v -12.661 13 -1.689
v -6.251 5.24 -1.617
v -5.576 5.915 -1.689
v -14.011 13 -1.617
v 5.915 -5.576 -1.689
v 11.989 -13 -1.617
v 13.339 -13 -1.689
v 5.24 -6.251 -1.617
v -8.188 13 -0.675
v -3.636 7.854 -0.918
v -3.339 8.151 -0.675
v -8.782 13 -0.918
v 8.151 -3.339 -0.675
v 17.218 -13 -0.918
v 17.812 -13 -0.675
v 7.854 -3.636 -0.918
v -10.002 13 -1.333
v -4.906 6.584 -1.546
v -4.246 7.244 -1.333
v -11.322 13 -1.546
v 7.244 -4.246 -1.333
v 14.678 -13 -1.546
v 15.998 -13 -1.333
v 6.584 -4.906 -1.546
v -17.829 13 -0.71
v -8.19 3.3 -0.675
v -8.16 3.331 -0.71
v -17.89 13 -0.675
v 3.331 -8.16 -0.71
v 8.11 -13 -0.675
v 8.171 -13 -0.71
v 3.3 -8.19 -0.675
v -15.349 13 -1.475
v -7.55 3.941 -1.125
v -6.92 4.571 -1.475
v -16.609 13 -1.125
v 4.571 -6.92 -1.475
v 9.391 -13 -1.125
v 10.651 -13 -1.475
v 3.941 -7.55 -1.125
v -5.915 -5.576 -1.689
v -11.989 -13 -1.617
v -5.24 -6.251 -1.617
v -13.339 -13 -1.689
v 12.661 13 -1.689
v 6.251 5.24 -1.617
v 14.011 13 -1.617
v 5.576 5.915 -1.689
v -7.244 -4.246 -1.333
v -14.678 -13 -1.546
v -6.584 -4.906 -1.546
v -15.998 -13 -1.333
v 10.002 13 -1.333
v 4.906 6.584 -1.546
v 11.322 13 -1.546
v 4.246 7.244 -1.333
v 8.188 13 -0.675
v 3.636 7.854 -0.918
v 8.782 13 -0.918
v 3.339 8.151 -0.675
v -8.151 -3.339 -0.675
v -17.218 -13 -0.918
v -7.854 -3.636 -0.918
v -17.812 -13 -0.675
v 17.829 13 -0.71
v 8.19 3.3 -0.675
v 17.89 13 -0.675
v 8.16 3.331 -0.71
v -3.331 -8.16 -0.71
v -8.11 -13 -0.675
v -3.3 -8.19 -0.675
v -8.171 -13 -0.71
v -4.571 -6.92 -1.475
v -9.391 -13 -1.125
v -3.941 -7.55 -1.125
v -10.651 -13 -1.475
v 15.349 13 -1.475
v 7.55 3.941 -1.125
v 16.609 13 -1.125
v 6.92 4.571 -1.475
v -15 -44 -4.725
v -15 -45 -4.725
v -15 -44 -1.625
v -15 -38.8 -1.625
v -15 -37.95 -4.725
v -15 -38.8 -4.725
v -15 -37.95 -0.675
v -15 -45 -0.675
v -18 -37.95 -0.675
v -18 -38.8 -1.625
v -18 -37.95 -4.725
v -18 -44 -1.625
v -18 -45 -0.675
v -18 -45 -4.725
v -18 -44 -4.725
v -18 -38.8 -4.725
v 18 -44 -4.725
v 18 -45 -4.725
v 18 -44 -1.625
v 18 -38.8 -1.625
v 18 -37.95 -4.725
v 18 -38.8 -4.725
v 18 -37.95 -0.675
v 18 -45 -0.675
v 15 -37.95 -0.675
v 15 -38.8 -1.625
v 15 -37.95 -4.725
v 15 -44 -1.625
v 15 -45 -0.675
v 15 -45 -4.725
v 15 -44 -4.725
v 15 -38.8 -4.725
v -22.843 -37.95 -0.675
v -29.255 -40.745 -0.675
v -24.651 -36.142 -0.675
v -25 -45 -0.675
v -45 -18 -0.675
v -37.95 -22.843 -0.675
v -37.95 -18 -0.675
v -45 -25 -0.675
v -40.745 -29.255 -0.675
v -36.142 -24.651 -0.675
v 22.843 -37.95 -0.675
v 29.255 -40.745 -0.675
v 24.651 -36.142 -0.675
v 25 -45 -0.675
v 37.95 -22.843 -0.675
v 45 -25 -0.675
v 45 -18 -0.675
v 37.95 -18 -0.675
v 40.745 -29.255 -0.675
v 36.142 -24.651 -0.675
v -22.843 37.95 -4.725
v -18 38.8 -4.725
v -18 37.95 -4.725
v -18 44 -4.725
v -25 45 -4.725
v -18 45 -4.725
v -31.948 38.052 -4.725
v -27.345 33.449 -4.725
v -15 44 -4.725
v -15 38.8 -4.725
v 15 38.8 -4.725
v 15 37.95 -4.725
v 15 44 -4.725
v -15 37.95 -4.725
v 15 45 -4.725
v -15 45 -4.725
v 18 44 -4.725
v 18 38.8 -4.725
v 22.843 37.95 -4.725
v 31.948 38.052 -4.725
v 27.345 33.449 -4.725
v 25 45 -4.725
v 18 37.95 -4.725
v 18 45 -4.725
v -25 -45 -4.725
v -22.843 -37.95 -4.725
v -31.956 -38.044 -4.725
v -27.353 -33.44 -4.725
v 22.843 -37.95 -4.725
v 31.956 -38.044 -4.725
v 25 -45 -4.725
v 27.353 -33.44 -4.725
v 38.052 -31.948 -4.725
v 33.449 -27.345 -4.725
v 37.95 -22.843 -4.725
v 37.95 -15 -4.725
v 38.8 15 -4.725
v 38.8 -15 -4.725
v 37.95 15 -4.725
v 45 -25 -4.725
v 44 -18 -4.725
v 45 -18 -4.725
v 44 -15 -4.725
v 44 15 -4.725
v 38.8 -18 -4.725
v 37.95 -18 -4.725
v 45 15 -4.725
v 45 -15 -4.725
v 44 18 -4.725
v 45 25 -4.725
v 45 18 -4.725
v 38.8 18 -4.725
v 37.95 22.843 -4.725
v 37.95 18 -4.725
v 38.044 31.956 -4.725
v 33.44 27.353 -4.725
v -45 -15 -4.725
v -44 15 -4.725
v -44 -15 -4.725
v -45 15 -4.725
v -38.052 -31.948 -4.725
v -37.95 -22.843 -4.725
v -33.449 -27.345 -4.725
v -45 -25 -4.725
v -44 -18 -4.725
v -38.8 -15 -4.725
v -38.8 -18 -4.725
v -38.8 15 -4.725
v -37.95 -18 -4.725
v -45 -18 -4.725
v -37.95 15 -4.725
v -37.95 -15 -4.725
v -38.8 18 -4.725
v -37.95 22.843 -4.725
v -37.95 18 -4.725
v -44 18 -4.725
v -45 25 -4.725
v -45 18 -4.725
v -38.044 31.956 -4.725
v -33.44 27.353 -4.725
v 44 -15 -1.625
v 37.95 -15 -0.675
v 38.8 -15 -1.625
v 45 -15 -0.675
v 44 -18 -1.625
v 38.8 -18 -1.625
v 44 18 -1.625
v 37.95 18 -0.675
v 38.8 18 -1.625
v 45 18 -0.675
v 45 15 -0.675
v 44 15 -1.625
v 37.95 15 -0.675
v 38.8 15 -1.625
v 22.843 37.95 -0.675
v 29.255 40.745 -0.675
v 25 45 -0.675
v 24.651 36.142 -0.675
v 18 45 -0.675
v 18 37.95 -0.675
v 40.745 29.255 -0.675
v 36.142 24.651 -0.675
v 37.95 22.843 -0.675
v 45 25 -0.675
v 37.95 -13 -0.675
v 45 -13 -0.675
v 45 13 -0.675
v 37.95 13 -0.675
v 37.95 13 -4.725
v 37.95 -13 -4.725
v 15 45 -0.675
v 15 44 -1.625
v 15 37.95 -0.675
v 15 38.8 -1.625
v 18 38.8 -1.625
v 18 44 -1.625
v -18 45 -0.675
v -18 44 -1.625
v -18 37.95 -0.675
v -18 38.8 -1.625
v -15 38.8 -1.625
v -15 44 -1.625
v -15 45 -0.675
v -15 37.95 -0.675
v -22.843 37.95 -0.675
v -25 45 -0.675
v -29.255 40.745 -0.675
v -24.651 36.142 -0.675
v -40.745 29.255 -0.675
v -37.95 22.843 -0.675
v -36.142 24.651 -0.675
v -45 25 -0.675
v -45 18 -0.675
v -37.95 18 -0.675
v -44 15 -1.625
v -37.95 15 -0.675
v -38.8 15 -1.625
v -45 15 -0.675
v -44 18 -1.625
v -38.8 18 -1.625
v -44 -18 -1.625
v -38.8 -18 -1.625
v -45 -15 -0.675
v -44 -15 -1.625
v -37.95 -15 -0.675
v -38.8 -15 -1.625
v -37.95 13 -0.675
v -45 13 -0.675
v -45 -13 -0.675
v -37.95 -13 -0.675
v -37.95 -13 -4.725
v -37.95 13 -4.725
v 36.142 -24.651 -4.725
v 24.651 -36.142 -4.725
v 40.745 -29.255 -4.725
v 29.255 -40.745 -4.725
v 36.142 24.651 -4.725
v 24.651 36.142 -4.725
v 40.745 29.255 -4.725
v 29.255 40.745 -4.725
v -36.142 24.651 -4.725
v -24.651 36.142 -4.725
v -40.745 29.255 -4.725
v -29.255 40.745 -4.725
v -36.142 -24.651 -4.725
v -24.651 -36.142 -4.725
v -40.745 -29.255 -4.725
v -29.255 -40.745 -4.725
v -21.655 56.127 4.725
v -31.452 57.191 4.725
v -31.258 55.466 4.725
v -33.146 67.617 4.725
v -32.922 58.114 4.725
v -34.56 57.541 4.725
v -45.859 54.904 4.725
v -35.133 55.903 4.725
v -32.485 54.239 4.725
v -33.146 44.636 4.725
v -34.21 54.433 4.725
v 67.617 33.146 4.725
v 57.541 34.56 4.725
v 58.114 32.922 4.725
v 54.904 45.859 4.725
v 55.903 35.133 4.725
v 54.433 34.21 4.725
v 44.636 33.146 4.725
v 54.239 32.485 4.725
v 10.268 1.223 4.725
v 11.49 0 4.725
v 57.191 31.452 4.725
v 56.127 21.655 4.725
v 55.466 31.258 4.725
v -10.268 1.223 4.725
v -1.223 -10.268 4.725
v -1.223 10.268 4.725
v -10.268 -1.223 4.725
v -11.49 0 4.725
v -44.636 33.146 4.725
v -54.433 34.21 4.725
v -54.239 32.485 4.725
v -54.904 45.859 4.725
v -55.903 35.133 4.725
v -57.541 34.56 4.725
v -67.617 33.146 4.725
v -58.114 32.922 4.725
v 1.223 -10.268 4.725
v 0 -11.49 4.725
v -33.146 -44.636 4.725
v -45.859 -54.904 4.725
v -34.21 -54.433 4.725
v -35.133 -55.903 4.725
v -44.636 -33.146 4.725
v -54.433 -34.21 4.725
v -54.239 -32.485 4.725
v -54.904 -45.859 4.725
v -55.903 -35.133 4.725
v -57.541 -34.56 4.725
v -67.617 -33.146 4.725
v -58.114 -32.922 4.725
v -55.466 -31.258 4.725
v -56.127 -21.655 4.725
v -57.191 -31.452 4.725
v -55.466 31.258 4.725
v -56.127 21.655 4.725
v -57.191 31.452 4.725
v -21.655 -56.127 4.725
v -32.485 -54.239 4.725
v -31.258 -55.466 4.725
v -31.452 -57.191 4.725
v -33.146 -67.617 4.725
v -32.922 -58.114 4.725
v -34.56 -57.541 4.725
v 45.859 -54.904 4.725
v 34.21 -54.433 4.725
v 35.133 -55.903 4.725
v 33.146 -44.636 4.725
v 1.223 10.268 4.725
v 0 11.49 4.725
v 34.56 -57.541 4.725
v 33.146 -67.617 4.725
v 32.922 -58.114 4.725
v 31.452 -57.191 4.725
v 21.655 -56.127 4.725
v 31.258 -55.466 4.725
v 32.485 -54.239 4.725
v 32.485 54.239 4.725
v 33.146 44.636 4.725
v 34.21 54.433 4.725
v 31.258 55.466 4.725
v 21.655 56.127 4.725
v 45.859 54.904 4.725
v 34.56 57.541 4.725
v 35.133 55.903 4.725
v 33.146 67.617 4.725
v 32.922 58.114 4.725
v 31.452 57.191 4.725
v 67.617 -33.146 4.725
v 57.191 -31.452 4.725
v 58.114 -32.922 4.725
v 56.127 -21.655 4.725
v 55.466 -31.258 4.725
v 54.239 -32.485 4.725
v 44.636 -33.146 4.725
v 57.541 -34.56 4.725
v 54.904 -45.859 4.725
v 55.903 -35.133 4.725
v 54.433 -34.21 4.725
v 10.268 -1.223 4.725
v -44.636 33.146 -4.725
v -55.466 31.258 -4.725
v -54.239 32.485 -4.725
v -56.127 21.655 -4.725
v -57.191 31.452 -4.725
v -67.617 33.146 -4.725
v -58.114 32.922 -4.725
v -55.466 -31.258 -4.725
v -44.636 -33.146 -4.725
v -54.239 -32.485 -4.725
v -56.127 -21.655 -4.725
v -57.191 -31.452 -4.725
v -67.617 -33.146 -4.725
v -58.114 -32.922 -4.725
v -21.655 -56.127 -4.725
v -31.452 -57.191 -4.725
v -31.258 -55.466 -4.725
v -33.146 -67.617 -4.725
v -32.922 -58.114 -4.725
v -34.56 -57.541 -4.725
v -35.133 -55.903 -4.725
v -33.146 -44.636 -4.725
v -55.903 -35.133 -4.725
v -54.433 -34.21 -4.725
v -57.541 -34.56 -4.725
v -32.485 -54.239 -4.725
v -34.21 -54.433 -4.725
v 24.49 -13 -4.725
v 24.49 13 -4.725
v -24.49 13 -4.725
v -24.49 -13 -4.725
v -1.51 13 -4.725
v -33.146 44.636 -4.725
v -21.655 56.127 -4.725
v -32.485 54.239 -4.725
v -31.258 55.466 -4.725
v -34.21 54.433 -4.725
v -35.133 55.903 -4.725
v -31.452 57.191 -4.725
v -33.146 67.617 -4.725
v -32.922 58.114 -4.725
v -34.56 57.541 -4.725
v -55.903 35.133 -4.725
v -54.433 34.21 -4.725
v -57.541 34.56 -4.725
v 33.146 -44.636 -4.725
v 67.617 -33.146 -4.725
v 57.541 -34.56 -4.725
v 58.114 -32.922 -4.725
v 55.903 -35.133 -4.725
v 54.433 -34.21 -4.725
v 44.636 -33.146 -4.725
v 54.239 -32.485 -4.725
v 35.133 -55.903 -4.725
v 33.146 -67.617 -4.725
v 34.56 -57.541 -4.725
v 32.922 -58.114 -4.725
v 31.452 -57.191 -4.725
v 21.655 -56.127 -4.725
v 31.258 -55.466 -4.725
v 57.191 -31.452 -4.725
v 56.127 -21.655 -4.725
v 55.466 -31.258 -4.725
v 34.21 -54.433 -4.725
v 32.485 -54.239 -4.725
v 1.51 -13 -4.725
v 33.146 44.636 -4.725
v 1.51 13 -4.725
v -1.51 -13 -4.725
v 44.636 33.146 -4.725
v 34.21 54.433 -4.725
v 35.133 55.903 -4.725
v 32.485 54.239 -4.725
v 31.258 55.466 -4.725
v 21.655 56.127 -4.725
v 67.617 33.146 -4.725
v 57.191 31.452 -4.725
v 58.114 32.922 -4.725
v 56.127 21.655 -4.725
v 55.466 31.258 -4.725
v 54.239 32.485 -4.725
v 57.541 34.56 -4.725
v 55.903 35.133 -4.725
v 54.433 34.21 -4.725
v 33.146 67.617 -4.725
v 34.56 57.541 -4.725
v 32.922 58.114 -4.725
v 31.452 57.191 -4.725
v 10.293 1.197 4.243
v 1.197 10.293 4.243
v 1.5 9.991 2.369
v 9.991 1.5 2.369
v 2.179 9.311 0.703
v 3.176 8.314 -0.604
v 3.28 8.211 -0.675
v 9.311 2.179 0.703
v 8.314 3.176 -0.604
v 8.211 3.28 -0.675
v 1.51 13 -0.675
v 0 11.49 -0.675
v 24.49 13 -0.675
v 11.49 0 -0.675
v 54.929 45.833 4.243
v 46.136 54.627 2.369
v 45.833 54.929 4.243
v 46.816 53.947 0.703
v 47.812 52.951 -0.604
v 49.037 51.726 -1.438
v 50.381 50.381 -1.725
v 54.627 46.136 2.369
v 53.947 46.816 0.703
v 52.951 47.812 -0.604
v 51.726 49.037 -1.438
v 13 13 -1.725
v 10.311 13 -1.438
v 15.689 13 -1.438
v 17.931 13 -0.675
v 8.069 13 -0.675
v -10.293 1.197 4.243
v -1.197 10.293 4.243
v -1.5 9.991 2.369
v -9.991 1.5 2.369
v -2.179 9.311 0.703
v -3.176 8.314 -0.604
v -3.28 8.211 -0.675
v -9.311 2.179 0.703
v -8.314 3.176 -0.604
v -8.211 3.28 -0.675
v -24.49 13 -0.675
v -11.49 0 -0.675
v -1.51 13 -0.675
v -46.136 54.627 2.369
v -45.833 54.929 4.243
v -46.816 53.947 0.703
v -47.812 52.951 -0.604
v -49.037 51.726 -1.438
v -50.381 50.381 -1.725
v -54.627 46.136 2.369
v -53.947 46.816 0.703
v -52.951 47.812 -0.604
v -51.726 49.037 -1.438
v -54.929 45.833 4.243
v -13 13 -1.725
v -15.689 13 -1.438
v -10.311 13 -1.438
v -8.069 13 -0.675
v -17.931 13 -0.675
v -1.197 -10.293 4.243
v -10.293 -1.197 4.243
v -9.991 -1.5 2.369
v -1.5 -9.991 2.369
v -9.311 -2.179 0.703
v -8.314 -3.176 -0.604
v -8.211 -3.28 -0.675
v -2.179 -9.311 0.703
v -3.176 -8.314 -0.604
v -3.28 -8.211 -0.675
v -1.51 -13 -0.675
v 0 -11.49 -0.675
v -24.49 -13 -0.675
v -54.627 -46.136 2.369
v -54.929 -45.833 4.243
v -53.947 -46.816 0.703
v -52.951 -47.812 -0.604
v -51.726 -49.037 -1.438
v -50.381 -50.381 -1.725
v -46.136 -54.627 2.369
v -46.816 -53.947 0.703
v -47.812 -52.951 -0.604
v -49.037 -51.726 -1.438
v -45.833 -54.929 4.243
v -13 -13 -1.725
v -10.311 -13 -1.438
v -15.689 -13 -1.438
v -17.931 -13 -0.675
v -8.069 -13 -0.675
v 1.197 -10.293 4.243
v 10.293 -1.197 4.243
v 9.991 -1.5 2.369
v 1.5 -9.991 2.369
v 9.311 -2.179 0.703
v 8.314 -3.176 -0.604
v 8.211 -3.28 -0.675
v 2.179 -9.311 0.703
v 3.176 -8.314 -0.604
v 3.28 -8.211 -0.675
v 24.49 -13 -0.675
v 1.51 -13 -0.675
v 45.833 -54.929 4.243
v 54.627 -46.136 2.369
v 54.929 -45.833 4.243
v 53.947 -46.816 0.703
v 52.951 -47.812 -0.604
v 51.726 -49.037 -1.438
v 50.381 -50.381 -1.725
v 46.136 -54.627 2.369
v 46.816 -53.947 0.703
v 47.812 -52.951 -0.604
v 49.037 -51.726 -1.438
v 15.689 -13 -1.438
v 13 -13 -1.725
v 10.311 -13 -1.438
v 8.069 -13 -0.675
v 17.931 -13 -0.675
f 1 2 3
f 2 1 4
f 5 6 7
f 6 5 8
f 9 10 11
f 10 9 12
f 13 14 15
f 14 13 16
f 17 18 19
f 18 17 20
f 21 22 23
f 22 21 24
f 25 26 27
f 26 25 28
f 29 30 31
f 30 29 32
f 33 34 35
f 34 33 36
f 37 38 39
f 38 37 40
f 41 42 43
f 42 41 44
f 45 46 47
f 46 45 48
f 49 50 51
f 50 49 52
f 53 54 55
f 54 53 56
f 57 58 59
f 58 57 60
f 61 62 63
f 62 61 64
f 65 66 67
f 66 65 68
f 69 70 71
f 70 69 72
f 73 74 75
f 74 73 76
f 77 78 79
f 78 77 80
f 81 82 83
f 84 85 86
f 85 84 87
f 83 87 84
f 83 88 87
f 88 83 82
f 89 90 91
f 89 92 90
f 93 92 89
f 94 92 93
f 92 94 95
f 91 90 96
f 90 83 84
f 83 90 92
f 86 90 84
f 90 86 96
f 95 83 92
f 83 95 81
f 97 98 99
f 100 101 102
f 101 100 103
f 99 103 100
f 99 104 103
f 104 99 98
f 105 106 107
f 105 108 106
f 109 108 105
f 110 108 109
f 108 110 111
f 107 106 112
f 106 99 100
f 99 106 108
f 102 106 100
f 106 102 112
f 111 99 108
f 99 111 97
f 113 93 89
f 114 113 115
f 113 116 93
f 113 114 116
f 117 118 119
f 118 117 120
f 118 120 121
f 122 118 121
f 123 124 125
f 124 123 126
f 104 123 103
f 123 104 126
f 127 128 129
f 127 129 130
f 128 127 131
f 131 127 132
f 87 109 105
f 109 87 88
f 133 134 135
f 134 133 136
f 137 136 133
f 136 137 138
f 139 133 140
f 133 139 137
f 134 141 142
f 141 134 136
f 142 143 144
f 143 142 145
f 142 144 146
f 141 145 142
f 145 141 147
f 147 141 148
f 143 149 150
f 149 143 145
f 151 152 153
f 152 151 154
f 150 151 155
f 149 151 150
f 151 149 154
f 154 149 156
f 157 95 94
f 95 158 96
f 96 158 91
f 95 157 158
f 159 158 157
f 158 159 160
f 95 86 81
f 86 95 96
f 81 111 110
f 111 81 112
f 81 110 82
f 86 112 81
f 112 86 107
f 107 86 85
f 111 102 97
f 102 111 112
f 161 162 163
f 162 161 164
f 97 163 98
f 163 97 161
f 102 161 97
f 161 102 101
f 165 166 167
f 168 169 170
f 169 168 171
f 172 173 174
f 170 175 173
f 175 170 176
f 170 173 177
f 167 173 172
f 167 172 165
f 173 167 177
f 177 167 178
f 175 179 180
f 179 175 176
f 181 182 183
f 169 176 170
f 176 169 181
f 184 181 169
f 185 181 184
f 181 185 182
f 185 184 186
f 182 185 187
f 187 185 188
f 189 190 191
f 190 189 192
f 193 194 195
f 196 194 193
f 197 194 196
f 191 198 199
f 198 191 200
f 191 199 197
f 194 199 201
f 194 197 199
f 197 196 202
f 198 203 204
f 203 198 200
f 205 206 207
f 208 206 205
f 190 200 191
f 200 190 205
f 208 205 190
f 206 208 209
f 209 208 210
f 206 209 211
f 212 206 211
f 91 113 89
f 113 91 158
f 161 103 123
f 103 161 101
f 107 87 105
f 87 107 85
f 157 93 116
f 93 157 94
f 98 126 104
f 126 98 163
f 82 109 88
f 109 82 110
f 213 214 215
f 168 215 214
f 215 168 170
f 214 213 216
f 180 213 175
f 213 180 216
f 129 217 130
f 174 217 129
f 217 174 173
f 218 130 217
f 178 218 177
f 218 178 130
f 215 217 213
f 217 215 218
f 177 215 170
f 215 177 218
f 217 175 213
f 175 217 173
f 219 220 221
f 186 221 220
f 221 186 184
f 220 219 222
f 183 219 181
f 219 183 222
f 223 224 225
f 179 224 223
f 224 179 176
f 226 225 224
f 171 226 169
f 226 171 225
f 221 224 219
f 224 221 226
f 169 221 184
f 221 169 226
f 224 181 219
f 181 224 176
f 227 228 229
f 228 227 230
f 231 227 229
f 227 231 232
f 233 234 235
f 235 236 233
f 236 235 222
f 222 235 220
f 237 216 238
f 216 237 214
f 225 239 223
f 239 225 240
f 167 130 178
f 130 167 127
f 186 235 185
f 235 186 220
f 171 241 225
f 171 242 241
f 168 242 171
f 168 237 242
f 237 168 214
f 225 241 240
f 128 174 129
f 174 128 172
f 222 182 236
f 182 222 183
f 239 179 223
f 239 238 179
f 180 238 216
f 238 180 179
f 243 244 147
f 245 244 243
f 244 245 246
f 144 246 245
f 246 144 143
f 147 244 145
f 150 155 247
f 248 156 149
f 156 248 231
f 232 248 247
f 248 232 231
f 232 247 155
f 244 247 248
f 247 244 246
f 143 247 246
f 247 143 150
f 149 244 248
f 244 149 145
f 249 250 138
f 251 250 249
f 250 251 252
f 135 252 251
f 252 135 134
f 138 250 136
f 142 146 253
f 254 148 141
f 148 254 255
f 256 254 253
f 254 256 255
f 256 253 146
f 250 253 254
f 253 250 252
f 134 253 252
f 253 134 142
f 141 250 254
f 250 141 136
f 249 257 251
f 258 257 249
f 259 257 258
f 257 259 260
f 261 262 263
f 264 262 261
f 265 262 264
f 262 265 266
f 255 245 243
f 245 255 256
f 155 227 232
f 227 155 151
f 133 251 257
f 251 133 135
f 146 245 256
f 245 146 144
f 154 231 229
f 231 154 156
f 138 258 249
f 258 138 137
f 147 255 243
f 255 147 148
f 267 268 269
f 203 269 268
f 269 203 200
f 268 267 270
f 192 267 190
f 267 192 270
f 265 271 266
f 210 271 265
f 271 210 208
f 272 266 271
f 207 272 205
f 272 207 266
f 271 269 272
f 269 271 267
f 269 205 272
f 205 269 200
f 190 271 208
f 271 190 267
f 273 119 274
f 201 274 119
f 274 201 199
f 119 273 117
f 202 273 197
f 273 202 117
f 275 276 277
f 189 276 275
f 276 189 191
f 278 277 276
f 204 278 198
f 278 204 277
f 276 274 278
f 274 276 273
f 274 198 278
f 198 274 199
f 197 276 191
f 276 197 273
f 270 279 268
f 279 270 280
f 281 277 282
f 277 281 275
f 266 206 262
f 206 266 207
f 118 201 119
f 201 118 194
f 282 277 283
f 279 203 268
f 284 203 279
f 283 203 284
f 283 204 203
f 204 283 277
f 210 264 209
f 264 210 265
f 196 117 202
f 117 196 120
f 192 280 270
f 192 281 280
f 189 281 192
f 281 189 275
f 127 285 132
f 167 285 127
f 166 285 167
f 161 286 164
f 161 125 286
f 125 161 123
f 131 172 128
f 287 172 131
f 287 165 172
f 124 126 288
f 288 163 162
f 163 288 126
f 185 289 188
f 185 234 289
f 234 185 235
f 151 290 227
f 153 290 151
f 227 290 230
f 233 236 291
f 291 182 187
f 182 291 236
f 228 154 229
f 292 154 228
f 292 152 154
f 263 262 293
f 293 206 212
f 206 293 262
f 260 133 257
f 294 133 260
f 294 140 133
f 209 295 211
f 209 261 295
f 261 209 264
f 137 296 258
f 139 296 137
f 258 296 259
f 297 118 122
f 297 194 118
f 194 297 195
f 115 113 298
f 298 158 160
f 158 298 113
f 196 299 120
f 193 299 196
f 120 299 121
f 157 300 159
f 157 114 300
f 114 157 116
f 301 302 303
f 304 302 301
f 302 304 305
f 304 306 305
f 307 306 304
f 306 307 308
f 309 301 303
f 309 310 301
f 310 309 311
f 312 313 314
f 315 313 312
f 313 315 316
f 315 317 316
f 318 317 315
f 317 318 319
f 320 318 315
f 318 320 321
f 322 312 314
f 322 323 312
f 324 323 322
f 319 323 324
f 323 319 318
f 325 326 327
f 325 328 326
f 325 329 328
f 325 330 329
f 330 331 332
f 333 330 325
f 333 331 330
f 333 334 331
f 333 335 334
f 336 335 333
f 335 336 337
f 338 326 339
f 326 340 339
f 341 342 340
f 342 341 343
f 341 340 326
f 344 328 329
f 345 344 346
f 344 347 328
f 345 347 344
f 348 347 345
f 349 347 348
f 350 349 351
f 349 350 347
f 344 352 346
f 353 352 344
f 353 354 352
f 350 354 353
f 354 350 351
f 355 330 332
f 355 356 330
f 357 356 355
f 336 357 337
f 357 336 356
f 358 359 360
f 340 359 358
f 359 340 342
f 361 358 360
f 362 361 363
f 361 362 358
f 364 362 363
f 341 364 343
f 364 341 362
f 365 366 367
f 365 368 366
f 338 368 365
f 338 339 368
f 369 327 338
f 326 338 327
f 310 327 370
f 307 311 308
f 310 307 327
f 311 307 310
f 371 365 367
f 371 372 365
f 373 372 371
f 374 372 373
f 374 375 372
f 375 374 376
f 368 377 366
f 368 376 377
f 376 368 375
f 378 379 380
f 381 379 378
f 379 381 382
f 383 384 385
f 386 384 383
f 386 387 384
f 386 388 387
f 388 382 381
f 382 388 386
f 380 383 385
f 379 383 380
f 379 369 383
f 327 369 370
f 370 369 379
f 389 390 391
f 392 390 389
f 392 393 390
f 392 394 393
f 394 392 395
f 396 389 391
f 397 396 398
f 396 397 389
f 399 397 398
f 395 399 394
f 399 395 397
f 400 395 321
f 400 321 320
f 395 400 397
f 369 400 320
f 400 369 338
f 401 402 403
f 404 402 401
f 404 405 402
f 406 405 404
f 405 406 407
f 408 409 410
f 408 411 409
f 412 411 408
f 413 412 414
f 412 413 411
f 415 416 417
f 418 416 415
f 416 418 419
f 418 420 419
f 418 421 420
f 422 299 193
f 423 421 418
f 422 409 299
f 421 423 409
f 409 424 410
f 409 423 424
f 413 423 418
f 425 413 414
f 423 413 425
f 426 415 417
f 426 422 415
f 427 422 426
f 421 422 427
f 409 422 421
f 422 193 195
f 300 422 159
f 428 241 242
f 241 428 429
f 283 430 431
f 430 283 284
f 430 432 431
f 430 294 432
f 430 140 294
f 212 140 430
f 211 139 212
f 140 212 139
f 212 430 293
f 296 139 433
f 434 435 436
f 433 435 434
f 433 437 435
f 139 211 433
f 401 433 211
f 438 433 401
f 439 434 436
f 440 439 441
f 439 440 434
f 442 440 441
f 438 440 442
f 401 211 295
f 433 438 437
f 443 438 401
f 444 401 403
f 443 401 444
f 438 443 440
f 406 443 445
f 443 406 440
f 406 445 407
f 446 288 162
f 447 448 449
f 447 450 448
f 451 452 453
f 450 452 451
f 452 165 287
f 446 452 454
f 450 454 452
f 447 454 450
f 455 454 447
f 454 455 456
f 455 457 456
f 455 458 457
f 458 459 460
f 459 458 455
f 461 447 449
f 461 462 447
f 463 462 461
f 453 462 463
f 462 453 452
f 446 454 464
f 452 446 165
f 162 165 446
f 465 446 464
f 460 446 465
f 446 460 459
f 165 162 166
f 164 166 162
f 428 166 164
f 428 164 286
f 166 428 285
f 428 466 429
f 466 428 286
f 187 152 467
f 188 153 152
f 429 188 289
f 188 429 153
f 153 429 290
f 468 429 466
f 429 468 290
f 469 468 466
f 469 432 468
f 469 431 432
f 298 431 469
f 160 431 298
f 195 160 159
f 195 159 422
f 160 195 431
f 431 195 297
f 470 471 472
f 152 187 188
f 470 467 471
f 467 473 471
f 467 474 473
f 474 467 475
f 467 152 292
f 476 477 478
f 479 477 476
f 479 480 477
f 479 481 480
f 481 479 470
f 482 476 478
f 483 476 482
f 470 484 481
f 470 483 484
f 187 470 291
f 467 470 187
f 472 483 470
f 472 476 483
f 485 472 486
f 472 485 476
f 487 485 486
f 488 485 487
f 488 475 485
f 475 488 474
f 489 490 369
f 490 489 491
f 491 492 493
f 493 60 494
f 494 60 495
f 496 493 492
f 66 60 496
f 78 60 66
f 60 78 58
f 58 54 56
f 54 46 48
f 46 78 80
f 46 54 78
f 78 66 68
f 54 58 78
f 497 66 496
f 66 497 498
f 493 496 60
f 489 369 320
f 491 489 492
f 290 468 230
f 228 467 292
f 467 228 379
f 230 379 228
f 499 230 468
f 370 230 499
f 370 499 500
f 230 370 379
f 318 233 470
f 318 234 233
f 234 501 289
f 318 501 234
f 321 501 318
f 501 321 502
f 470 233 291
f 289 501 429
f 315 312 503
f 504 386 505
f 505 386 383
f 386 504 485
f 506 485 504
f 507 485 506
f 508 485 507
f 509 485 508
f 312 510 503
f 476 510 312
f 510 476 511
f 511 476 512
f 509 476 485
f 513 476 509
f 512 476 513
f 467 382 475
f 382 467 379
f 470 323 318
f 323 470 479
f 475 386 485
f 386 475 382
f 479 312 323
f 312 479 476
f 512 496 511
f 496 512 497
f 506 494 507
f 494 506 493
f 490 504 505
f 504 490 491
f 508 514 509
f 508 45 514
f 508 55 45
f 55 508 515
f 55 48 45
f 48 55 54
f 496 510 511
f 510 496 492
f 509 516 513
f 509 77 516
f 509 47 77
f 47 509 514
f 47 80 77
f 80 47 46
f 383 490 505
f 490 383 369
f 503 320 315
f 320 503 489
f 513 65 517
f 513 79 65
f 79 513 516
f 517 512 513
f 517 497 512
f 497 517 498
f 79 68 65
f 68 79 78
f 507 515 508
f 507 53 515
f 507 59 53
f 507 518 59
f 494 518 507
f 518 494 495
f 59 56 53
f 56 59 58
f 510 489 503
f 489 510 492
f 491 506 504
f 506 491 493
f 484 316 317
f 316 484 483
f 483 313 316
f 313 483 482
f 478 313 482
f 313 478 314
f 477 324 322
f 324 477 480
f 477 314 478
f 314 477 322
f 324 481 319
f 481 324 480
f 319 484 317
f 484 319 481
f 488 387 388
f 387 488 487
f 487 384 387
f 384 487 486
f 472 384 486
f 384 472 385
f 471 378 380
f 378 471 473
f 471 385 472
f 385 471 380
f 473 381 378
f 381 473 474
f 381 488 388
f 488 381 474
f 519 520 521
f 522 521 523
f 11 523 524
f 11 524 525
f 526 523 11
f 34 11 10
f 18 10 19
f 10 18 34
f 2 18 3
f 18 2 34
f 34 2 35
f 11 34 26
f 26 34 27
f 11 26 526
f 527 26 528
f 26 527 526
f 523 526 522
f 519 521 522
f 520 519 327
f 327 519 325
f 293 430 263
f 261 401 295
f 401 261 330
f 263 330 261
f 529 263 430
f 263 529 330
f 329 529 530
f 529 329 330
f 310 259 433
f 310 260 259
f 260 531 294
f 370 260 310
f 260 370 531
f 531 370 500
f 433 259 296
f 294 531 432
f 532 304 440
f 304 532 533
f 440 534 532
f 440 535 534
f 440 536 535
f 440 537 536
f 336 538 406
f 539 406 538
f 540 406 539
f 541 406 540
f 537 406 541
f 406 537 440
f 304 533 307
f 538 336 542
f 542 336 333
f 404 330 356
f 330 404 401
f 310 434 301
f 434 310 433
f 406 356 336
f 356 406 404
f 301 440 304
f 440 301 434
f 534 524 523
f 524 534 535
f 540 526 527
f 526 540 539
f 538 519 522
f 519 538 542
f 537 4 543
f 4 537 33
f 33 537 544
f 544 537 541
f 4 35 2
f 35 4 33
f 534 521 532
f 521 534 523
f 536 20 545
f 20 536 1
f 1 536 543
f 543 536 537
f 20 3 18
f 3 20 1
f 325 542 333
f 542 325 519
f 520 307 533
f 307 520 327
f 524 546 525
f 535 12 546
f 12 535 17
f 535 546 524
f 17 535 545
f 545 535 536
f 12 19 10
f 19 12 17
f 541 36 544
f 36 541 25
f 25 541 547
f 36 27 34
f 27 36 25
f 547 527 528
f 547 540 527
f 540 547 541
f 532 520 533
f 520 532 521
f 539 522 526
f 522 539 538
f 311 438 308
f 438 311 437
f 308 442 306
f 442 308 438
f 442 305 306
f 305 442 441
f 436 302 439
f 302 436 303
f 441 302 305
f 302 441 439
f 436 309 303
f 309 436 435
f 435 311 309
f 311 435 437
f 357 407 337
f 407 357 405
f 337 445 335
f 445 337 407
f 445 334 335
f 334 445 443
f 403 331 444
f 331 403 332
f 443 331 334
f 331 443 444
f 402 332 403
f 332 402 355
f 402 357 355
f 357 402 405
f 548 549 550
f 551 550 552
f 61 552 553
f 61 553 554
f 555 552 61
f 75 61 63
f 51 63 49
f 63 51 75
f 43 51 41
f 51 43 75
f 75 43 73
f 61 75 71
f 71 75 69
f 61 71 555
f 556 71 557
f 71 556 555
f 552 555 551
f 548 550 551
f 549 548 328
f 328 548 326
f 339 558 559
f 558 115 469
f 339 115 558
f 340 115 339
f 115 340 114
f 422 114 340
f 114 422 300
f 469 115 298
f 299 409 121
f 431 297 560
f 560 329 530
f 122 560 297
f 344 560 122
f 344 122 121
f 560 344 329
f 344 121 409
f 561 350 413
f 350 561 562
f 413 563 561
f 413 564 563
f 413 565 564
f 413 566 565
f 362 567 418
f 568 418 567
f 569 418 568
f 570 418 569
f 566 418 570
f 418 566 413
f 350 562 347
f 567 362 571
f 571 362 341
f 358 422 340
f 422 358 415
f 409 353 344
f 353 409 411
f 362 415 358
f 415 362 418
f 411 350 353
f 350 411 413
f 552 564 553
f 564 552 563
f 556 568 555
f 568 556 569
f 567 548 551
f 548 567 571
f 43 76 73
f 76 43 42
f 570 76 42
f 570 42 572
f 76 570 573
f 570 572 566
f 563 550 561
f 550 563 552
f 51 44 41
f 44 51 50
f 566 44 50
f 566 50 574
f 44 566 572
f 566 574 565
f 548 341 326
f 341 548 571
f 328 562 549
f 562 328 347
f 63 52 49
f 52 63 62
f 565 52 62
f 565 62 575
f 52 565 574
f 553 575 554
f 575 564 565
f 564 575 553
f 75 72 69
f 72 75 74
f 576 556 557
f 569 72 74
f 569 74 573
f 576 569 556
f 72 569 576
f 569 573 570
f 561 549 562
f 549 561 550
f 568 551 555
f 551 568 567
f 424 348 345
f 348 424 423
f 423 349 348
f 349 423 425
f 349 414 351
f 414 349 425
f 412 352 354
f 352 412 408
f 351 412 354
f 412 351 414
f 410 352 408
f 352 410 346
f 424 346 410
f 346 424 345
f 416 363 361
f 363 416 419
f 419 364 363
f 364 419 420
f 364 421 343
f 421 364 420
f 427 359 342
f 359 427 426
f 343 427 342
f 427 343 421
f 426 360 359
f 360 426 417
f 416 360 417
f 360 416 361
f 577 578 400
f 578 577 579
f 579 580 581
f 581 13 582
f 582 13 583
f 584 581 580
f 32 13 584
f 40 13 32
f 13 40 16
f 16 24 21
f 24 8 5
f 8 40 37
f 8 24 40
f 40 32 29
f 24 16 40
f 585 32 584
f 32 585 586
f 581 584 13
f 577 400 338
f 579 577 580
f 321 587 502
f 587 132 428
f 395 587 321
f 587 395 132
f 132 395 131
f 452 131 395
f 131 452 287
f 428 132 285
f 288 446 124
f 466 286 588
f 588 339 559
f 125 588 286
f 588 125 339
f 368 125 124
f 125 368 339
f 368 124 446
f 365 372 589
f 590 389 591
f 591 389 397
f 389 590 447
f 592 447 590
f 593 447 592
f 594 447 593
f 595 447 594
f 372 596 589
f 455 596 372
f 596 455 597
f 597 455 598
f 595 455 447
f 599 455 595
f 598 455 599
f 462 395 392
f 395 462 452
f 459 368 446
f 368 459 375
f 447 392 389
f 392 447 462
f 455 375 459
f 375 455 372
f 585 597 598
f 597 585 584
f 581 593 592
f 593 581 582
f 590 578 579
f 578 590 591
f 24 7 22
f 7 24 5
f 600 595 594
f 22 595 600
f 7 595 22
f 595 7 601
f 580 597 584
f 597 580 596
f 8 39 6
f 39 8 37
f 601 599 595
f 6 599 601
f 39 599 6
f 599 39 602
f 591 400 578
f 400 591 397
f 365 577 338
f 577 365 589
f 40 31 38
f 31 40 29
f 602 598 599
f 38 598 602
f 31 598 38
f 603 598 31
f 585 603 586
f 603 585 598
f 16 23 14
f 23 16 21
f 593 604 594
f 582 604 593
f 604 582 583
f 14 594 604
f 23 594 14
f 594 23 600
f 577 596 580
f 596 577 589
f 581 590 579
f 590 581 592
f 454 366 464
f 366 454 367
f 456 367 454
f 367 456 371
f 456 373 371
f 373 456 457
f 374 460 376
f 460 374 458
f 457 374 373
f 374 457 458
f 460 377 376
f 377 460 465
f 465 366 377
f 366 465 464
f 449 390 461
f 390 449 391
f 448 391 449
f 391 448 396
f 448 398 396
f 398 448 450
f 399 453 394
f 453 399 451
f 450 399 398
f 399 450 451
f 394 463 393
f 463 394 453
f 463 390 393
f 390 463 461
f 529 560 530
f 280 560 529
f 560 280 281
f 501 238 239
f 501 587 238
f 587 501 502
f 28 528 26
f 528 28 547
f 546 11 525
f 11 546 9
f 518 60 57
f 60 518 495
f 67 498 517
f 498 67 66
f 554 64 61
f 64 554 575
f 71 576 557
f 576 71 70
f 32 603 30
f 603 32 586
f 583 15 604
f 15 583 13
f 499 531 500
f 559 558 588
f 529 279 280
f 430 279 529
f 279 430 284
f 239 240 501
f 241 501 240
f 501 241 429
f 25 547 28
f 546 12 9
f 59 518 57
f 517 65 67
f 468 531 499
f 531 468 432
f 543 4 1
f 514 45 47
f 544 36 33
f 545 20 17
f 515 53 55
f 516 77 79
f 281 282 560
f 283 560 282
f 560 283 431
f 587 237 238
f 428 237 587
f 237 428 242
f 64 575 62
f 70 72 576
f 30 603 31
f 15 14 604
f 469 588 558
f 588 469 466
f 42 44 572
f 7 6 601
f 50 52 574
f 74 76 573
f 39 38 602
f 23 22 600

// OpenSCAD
// file: plsq.scad
/**
 * PLSQ Leshy
 *
 * @id plsq-leshy
 * @root
 * @name PLSQ Leshy
 * @using 1 glue
 * @using 4 plsq-arm
 * @using 4 plsq-motor-mount
 * @using 1 plsq-camera-holder
 * @using 1 plsq-camera-mount
 * @using 1 plsq-canopy
 * @using 1 plsq-body
 * @using 1 plsq-legs
 */

/********************
 * Global variables *
 *******************/
debug = true;
th = 0.3;
// Amount of space to leave between press-fit parts
tolerance = 0.25;

/**************************************
 * Arm measurements, prefixed with a_ *
 *************************************/
a_raft_r = 30.6;
a_overlap = 20;
a_short_h = 4;
a_short_r = 12.6;
a_tall_h = 140;
a_tall_r = 12.75;
a_tall_th = 2;
a_slot_w = 5.5;
a_slot_lower_h = 25.48;
a_slot_upper_h = 22;
a_coupler_h = 30;

/*******************************************
 * Chassis measurements, prefixed with ch_ *
 *******************************************/
ch_full_l = 90;
ch_45_l = 2 * a_short_r + 3.0843;
ch_short_l = ch_full_l - 2 * cos(45) * ch_45_l;
ch_90_th = 7.05;
ch_45_th = 6.51;
ch_45_diag = (ch_full_l / 2) / cos(45);
ch_full_h = 4.05; // height of a chassis layer
ch_cutout_w = 3; // width of cutout
ch_cutout_th = 0.75;
ch_cutout_front_th = 1.1;
ch_cutout_back_th = 0.75;
ch_cutout_ratio = 0.14;

/***************************************
 * Body measurements, prefixed with b_ *
 **************************************/
b_h = 2 * a_short_r - (a_short_r - a_tall_r) - ch_full_h;
b_beam_h = 3.6;
b_beam_w = 2 * a_tall_r - 2 * a_tall_th;
b_beam_trim = 0.78;
b_arm_r = a_tall_r - a_tall_th - tolerance;
b_arm_th = 2.9;
b_beam_cyl_h = 3;
b_beam_cyl_r = 3.01;
b_beam_cyl_th = 1.5;
b_beam_cyl_place = 0.6815 * (ch_45_diag - ch_45_l / 2 - b_beam_w);

/*****************************************
 * Canopy measurements, prefixed with c_ *
 ****************************************/
c_45_l = 2 * a_short_r + 2;
// Lengths of sides of different cross-sections
c_bottom_l = ch_full_l + 8.5;
c_middle_l = 0.9877 * c_bottom_l;
c_top_l = 0.5707 * c_bottom_l;
// Heights of different sections
c_bottom_h = 2 * a_tall_r + 14.1;
c_top_h = 0.519 * c_bottom_h;
// Thickness of the canopy walls
c_th = 2;
// Window dimensions
c_window_w = 2 * (a_tall_r + 0.45);
c_window_h = b_h + 5.63;
// Width of the receiver bay
c_receiver_w = 12;
c_receiver_angle = 20;
c_text = "Leshy";

/**************************************
 * Leg measurements, prefixed with l_ *
 *************************************/
l_leg_l = 25;
l_leg_th = a_slot_w - 0.5;
l_cam_h = 70;
l_h = 50;
l_raft_r = 10;
l_strip_ratio = 0.5;
l_camera_strip_offset = 2.6;
l_camera_thin_th = 7.45;
l_camera_thick_th = 18.6;
l_camera_thick_ratio = 0.622;

/***********************************************
 * Motor mount measurements, prefixed with mm_ *
 ***********************************************/
mm_open_l = 32;
mm_open_pad1 = 2;
mm_open_pad2 = 3.4;
mm_arm_l = a_slot_upper_h - 1 + mm_open_l + mm_open_pad1 + mm_open_pad2;
mm_arm_half1 = 0.61 * mm_arm_l;
mm_raft_r = 10;
mm_arm_short_r = a_tall_r - a_tall_th - tolerance;
mm_arm_th = 3;
mm_arm_tall_th = 2.4;
mm_arm_tall_r = a_tall_r;
mm_arm_runner = a_slot_w - 2 * tolerance;
mm_cup_base_h = 5;
mm_cup_h1 = 15;
mm_cup_h2 = mm_cup_h1 + mm_cup_base_h + 3;
mm_cup_r1 = 18;
mm_cup_r2 = mm_cup_r1 - 2;
mm_cup_r3 = mm_cup_r2 + 2 * tolerance;
mm_cup_th = 1;
// cup depression
mm_cup_dep_r1 = 4.1;
mm_cup_dep_r2 = 4.53;
mm_cup_dep_h = 3;
mm_cup_hole_h1 = 2.2;
mm_cup_hole_h2 = 0.5;
mm_cup_hole_r1 = 3.1;
mm_cup_hole_r2 = 1.68;

/*************************************************
 * Camera holder measurements, prefixed with camh_ *
 ************************************************/
camh_h1 = 13;
camh_h2 = 14;
camh_w = ch_short_l - 2 * ch_cutout_ratio * ch_short_l -
      2 * ch_cutout_w - 0.15;
camh_th = 0.65;
camh_pad1 = 1.5;
camh_pad2 = 2;
// tapered section
camh_tap_sec_l = 0.26 * (ch_full_l / 2 - l_camera_thick_th -
                 ch_90_th);
camh_tap_angle = 32;
// chassis section
camh_camh_sec_l = ch_90_th + 2 * camh_th + 0.2;
camh_camh_sec_h = camh_h2 - 2.5;
// canopy section
camh_can_sec_l = 4;
camh_can_sec_h = 3;
// Hinges
camh_hinge1_r1 = 5;
camh_hinge1_r2 = 3.9;
camh_hinge1_r3 = 1.5;
camh_hinge1_w = 8.5;
camh_hinge1_off = 2;
camh_hinge2_r1 = 3;
camh_hinge2_r2 = 2.32;
camh_hinge2_r3 = 0.5;
camh_hinge2_w = 2.5;
camh_hinge2_off = 1.4;
camh_l = camh_tap_sec_l + camh_pad1 + camh_pad2 +
         camh_camh_sec_l + camh_can_sec_l;

/************************************************
 * Camera mount measurements, prefixed with cm_ *
 ***********************************************/
cm_w = 65;
cm_l = 35;
cm_h = 43.9;
cm_th = 2;
cm_hinge_off = 1.5;
cm_hinge_w = 11;
cm_hinge_h = 11;
cm_hinge_r1 = 3.475;
cm_hinge_r2 = 1.425;
cm_h_w = 9;
cm_h_h = 33;
cm_h_l = 14;
cm_h_r = 4.3;
cm_h_th = 1.5;
cm_h_r2 = 1;
// file: chassis.scad
include <model_dims.scad>
include <hardware_dims.scad>
include <plsq.scad>

module chassis() {
		
	for (i = [0: 45: 360 - 45]) {
		rotate([0, 0, i]) {
			if (i % 90 == 0) {
				translate([-ch_short_l / 2, -ch_full_l / 2, 0]) {
					difference() {
						cube([ch_short_l, ch_90_th, ch_full_h]);

						// Cutouts
						for (j = [0: 1]) {
							translate(
								[
									j == 0 ? (ch_cutout_ratio * ch_short_l) : ((1 - ch_cutout_ratio) * ch_short_l - ch_cutout_w), 
									debug ? -0.1 : 0, 
									debug ? -0.1 : 0
								]
							)
							difference() {
								cube([ch_cutout_w, ch_90_th + (debug ? 0.2 : 0), ch_full_h + (debug ? 0.2 : 0)]);
								translate([debug ? -0.1 : 0, ch_cutout_front_th, debug ? -0.1 : 0]) {
									cube([
										ch_cutout_w + (debug ? 0.2 : 0), 
										ch_90_th - ch_cutout_front_th - ch_cutout_back_th, 
										ch_full_h - ch_cutout_th
									]);
								}
							}
						}
					}
				}
			} else { // i % 45 == 0
				translate([0, -ch_45_diag + ch_45_l / 2, 0]) {
					translate([-ch_45_l / 2, 0, 0]) {
						cube([ch_45_l, ch_45_th, ch_full_h]);
					}
				}
			child();
			}

		}
		
	}
}
// file: model_dims.scad
// motormounts
m_h = c_d/2 + 3; 	// height of motor mount
x_1 = 16.25;		// distance from centre of motor mount to centre of screwholes
m_w = x_1; 			// width of motor mount

// body
ah_l = 55 ;//arm_holder_length
ch_full_l = 90; // full width of chassis
ch_full_h = 4.05; // height of chassis layer
// file: hardware_dims.scad
c_d = 12.9; 		// diameter of carbon fiber
s_d = 4; 			// diameter of silver screw holes

// units of PDB
pdb_bw = 50; // board_width
pdb_ch_d = 12.7; //centre_hole_dia = 12.8
sh_d = 3.2; //small_hole_dia = 3
dh_sd = 7.9; //small_hole_dist_from_side = 7.9
lh_sd = 19; //large_hole_dist_from_side = 19
p_w = 7.7; //pin_width = 7.7
d_diag = 13.9; //deans_diag = 13.9
p_sd = 8.4; //pin_dist_from_side = 8.4
d_sd = 20.8; //deans_dist_from_side = 20.8
sh_dc = 16.2; // small hole (orthogonal) distance from center
// main file
include <hardware_dims.scad>
include <model_dims.scad>
include <chassis.scad>

module arm_holder(){
	// this bit holds the carbon fiber steady in the center
	difference(){
		union() {
				cube([ah_l,m_w,m_h],center=true); // main arm
				translate([ah_l/2,0,0]) cube(size=[1*m_w,3*m_w,m_h], center=true); //clamp blocks
		}
		translate([0,0,m_h/2]){
			rotate([0,90,0]){
				cylinder(h=2*ah_l, r=c_d/2, center=true); // carbon fiber cutout
			}
		}
		translate([ah_l/2,-x_1,0]) cylinder(h=2*m_h, r=s_d/2,center=true); // screw holes
		translate([ah_l/2,x_1,0]) cylinder(h=2*m_h, r=s_d/2,center=true); // screw holes
	}	
}

module fiber_cutout(){
	translate([0,0,m_h/2]){
		rotate([90,0,45]){
			cylinder(h=2*ah_l, r=c_d/2, center=true); // carbon fiber cutout
		}
	}
	translate([0,0,m_h/2]){
		rotate([90,0,90+45]){
			cylinder(h=2*ah_l, r=c_d/2, center=true); // carbon fiber cutout
		}
	}
}

module center_block(){
	cube([m_w,m_w,m_h],center=true);
}

module mount_block(){
	cube([ch_full_l,1.6*m_w,ch_full_h],center=true);
}


translate([0,0,-m_h/2]){
	difference(){
		chassis();
		// clean up channels
		fiber_cutout();
	}
}


rotate(45){
	center_block();
	for (i = [0: 90: 270]) {
		rotate([0,0,i]){
			translate([ah_l/2 + m_w/2 ,0,0]){
				arm_holder();	
			}
		}
	}
}
difference(){
	translate([0,0,-2.7]) mount_block();
	fiber_cutout();
}
